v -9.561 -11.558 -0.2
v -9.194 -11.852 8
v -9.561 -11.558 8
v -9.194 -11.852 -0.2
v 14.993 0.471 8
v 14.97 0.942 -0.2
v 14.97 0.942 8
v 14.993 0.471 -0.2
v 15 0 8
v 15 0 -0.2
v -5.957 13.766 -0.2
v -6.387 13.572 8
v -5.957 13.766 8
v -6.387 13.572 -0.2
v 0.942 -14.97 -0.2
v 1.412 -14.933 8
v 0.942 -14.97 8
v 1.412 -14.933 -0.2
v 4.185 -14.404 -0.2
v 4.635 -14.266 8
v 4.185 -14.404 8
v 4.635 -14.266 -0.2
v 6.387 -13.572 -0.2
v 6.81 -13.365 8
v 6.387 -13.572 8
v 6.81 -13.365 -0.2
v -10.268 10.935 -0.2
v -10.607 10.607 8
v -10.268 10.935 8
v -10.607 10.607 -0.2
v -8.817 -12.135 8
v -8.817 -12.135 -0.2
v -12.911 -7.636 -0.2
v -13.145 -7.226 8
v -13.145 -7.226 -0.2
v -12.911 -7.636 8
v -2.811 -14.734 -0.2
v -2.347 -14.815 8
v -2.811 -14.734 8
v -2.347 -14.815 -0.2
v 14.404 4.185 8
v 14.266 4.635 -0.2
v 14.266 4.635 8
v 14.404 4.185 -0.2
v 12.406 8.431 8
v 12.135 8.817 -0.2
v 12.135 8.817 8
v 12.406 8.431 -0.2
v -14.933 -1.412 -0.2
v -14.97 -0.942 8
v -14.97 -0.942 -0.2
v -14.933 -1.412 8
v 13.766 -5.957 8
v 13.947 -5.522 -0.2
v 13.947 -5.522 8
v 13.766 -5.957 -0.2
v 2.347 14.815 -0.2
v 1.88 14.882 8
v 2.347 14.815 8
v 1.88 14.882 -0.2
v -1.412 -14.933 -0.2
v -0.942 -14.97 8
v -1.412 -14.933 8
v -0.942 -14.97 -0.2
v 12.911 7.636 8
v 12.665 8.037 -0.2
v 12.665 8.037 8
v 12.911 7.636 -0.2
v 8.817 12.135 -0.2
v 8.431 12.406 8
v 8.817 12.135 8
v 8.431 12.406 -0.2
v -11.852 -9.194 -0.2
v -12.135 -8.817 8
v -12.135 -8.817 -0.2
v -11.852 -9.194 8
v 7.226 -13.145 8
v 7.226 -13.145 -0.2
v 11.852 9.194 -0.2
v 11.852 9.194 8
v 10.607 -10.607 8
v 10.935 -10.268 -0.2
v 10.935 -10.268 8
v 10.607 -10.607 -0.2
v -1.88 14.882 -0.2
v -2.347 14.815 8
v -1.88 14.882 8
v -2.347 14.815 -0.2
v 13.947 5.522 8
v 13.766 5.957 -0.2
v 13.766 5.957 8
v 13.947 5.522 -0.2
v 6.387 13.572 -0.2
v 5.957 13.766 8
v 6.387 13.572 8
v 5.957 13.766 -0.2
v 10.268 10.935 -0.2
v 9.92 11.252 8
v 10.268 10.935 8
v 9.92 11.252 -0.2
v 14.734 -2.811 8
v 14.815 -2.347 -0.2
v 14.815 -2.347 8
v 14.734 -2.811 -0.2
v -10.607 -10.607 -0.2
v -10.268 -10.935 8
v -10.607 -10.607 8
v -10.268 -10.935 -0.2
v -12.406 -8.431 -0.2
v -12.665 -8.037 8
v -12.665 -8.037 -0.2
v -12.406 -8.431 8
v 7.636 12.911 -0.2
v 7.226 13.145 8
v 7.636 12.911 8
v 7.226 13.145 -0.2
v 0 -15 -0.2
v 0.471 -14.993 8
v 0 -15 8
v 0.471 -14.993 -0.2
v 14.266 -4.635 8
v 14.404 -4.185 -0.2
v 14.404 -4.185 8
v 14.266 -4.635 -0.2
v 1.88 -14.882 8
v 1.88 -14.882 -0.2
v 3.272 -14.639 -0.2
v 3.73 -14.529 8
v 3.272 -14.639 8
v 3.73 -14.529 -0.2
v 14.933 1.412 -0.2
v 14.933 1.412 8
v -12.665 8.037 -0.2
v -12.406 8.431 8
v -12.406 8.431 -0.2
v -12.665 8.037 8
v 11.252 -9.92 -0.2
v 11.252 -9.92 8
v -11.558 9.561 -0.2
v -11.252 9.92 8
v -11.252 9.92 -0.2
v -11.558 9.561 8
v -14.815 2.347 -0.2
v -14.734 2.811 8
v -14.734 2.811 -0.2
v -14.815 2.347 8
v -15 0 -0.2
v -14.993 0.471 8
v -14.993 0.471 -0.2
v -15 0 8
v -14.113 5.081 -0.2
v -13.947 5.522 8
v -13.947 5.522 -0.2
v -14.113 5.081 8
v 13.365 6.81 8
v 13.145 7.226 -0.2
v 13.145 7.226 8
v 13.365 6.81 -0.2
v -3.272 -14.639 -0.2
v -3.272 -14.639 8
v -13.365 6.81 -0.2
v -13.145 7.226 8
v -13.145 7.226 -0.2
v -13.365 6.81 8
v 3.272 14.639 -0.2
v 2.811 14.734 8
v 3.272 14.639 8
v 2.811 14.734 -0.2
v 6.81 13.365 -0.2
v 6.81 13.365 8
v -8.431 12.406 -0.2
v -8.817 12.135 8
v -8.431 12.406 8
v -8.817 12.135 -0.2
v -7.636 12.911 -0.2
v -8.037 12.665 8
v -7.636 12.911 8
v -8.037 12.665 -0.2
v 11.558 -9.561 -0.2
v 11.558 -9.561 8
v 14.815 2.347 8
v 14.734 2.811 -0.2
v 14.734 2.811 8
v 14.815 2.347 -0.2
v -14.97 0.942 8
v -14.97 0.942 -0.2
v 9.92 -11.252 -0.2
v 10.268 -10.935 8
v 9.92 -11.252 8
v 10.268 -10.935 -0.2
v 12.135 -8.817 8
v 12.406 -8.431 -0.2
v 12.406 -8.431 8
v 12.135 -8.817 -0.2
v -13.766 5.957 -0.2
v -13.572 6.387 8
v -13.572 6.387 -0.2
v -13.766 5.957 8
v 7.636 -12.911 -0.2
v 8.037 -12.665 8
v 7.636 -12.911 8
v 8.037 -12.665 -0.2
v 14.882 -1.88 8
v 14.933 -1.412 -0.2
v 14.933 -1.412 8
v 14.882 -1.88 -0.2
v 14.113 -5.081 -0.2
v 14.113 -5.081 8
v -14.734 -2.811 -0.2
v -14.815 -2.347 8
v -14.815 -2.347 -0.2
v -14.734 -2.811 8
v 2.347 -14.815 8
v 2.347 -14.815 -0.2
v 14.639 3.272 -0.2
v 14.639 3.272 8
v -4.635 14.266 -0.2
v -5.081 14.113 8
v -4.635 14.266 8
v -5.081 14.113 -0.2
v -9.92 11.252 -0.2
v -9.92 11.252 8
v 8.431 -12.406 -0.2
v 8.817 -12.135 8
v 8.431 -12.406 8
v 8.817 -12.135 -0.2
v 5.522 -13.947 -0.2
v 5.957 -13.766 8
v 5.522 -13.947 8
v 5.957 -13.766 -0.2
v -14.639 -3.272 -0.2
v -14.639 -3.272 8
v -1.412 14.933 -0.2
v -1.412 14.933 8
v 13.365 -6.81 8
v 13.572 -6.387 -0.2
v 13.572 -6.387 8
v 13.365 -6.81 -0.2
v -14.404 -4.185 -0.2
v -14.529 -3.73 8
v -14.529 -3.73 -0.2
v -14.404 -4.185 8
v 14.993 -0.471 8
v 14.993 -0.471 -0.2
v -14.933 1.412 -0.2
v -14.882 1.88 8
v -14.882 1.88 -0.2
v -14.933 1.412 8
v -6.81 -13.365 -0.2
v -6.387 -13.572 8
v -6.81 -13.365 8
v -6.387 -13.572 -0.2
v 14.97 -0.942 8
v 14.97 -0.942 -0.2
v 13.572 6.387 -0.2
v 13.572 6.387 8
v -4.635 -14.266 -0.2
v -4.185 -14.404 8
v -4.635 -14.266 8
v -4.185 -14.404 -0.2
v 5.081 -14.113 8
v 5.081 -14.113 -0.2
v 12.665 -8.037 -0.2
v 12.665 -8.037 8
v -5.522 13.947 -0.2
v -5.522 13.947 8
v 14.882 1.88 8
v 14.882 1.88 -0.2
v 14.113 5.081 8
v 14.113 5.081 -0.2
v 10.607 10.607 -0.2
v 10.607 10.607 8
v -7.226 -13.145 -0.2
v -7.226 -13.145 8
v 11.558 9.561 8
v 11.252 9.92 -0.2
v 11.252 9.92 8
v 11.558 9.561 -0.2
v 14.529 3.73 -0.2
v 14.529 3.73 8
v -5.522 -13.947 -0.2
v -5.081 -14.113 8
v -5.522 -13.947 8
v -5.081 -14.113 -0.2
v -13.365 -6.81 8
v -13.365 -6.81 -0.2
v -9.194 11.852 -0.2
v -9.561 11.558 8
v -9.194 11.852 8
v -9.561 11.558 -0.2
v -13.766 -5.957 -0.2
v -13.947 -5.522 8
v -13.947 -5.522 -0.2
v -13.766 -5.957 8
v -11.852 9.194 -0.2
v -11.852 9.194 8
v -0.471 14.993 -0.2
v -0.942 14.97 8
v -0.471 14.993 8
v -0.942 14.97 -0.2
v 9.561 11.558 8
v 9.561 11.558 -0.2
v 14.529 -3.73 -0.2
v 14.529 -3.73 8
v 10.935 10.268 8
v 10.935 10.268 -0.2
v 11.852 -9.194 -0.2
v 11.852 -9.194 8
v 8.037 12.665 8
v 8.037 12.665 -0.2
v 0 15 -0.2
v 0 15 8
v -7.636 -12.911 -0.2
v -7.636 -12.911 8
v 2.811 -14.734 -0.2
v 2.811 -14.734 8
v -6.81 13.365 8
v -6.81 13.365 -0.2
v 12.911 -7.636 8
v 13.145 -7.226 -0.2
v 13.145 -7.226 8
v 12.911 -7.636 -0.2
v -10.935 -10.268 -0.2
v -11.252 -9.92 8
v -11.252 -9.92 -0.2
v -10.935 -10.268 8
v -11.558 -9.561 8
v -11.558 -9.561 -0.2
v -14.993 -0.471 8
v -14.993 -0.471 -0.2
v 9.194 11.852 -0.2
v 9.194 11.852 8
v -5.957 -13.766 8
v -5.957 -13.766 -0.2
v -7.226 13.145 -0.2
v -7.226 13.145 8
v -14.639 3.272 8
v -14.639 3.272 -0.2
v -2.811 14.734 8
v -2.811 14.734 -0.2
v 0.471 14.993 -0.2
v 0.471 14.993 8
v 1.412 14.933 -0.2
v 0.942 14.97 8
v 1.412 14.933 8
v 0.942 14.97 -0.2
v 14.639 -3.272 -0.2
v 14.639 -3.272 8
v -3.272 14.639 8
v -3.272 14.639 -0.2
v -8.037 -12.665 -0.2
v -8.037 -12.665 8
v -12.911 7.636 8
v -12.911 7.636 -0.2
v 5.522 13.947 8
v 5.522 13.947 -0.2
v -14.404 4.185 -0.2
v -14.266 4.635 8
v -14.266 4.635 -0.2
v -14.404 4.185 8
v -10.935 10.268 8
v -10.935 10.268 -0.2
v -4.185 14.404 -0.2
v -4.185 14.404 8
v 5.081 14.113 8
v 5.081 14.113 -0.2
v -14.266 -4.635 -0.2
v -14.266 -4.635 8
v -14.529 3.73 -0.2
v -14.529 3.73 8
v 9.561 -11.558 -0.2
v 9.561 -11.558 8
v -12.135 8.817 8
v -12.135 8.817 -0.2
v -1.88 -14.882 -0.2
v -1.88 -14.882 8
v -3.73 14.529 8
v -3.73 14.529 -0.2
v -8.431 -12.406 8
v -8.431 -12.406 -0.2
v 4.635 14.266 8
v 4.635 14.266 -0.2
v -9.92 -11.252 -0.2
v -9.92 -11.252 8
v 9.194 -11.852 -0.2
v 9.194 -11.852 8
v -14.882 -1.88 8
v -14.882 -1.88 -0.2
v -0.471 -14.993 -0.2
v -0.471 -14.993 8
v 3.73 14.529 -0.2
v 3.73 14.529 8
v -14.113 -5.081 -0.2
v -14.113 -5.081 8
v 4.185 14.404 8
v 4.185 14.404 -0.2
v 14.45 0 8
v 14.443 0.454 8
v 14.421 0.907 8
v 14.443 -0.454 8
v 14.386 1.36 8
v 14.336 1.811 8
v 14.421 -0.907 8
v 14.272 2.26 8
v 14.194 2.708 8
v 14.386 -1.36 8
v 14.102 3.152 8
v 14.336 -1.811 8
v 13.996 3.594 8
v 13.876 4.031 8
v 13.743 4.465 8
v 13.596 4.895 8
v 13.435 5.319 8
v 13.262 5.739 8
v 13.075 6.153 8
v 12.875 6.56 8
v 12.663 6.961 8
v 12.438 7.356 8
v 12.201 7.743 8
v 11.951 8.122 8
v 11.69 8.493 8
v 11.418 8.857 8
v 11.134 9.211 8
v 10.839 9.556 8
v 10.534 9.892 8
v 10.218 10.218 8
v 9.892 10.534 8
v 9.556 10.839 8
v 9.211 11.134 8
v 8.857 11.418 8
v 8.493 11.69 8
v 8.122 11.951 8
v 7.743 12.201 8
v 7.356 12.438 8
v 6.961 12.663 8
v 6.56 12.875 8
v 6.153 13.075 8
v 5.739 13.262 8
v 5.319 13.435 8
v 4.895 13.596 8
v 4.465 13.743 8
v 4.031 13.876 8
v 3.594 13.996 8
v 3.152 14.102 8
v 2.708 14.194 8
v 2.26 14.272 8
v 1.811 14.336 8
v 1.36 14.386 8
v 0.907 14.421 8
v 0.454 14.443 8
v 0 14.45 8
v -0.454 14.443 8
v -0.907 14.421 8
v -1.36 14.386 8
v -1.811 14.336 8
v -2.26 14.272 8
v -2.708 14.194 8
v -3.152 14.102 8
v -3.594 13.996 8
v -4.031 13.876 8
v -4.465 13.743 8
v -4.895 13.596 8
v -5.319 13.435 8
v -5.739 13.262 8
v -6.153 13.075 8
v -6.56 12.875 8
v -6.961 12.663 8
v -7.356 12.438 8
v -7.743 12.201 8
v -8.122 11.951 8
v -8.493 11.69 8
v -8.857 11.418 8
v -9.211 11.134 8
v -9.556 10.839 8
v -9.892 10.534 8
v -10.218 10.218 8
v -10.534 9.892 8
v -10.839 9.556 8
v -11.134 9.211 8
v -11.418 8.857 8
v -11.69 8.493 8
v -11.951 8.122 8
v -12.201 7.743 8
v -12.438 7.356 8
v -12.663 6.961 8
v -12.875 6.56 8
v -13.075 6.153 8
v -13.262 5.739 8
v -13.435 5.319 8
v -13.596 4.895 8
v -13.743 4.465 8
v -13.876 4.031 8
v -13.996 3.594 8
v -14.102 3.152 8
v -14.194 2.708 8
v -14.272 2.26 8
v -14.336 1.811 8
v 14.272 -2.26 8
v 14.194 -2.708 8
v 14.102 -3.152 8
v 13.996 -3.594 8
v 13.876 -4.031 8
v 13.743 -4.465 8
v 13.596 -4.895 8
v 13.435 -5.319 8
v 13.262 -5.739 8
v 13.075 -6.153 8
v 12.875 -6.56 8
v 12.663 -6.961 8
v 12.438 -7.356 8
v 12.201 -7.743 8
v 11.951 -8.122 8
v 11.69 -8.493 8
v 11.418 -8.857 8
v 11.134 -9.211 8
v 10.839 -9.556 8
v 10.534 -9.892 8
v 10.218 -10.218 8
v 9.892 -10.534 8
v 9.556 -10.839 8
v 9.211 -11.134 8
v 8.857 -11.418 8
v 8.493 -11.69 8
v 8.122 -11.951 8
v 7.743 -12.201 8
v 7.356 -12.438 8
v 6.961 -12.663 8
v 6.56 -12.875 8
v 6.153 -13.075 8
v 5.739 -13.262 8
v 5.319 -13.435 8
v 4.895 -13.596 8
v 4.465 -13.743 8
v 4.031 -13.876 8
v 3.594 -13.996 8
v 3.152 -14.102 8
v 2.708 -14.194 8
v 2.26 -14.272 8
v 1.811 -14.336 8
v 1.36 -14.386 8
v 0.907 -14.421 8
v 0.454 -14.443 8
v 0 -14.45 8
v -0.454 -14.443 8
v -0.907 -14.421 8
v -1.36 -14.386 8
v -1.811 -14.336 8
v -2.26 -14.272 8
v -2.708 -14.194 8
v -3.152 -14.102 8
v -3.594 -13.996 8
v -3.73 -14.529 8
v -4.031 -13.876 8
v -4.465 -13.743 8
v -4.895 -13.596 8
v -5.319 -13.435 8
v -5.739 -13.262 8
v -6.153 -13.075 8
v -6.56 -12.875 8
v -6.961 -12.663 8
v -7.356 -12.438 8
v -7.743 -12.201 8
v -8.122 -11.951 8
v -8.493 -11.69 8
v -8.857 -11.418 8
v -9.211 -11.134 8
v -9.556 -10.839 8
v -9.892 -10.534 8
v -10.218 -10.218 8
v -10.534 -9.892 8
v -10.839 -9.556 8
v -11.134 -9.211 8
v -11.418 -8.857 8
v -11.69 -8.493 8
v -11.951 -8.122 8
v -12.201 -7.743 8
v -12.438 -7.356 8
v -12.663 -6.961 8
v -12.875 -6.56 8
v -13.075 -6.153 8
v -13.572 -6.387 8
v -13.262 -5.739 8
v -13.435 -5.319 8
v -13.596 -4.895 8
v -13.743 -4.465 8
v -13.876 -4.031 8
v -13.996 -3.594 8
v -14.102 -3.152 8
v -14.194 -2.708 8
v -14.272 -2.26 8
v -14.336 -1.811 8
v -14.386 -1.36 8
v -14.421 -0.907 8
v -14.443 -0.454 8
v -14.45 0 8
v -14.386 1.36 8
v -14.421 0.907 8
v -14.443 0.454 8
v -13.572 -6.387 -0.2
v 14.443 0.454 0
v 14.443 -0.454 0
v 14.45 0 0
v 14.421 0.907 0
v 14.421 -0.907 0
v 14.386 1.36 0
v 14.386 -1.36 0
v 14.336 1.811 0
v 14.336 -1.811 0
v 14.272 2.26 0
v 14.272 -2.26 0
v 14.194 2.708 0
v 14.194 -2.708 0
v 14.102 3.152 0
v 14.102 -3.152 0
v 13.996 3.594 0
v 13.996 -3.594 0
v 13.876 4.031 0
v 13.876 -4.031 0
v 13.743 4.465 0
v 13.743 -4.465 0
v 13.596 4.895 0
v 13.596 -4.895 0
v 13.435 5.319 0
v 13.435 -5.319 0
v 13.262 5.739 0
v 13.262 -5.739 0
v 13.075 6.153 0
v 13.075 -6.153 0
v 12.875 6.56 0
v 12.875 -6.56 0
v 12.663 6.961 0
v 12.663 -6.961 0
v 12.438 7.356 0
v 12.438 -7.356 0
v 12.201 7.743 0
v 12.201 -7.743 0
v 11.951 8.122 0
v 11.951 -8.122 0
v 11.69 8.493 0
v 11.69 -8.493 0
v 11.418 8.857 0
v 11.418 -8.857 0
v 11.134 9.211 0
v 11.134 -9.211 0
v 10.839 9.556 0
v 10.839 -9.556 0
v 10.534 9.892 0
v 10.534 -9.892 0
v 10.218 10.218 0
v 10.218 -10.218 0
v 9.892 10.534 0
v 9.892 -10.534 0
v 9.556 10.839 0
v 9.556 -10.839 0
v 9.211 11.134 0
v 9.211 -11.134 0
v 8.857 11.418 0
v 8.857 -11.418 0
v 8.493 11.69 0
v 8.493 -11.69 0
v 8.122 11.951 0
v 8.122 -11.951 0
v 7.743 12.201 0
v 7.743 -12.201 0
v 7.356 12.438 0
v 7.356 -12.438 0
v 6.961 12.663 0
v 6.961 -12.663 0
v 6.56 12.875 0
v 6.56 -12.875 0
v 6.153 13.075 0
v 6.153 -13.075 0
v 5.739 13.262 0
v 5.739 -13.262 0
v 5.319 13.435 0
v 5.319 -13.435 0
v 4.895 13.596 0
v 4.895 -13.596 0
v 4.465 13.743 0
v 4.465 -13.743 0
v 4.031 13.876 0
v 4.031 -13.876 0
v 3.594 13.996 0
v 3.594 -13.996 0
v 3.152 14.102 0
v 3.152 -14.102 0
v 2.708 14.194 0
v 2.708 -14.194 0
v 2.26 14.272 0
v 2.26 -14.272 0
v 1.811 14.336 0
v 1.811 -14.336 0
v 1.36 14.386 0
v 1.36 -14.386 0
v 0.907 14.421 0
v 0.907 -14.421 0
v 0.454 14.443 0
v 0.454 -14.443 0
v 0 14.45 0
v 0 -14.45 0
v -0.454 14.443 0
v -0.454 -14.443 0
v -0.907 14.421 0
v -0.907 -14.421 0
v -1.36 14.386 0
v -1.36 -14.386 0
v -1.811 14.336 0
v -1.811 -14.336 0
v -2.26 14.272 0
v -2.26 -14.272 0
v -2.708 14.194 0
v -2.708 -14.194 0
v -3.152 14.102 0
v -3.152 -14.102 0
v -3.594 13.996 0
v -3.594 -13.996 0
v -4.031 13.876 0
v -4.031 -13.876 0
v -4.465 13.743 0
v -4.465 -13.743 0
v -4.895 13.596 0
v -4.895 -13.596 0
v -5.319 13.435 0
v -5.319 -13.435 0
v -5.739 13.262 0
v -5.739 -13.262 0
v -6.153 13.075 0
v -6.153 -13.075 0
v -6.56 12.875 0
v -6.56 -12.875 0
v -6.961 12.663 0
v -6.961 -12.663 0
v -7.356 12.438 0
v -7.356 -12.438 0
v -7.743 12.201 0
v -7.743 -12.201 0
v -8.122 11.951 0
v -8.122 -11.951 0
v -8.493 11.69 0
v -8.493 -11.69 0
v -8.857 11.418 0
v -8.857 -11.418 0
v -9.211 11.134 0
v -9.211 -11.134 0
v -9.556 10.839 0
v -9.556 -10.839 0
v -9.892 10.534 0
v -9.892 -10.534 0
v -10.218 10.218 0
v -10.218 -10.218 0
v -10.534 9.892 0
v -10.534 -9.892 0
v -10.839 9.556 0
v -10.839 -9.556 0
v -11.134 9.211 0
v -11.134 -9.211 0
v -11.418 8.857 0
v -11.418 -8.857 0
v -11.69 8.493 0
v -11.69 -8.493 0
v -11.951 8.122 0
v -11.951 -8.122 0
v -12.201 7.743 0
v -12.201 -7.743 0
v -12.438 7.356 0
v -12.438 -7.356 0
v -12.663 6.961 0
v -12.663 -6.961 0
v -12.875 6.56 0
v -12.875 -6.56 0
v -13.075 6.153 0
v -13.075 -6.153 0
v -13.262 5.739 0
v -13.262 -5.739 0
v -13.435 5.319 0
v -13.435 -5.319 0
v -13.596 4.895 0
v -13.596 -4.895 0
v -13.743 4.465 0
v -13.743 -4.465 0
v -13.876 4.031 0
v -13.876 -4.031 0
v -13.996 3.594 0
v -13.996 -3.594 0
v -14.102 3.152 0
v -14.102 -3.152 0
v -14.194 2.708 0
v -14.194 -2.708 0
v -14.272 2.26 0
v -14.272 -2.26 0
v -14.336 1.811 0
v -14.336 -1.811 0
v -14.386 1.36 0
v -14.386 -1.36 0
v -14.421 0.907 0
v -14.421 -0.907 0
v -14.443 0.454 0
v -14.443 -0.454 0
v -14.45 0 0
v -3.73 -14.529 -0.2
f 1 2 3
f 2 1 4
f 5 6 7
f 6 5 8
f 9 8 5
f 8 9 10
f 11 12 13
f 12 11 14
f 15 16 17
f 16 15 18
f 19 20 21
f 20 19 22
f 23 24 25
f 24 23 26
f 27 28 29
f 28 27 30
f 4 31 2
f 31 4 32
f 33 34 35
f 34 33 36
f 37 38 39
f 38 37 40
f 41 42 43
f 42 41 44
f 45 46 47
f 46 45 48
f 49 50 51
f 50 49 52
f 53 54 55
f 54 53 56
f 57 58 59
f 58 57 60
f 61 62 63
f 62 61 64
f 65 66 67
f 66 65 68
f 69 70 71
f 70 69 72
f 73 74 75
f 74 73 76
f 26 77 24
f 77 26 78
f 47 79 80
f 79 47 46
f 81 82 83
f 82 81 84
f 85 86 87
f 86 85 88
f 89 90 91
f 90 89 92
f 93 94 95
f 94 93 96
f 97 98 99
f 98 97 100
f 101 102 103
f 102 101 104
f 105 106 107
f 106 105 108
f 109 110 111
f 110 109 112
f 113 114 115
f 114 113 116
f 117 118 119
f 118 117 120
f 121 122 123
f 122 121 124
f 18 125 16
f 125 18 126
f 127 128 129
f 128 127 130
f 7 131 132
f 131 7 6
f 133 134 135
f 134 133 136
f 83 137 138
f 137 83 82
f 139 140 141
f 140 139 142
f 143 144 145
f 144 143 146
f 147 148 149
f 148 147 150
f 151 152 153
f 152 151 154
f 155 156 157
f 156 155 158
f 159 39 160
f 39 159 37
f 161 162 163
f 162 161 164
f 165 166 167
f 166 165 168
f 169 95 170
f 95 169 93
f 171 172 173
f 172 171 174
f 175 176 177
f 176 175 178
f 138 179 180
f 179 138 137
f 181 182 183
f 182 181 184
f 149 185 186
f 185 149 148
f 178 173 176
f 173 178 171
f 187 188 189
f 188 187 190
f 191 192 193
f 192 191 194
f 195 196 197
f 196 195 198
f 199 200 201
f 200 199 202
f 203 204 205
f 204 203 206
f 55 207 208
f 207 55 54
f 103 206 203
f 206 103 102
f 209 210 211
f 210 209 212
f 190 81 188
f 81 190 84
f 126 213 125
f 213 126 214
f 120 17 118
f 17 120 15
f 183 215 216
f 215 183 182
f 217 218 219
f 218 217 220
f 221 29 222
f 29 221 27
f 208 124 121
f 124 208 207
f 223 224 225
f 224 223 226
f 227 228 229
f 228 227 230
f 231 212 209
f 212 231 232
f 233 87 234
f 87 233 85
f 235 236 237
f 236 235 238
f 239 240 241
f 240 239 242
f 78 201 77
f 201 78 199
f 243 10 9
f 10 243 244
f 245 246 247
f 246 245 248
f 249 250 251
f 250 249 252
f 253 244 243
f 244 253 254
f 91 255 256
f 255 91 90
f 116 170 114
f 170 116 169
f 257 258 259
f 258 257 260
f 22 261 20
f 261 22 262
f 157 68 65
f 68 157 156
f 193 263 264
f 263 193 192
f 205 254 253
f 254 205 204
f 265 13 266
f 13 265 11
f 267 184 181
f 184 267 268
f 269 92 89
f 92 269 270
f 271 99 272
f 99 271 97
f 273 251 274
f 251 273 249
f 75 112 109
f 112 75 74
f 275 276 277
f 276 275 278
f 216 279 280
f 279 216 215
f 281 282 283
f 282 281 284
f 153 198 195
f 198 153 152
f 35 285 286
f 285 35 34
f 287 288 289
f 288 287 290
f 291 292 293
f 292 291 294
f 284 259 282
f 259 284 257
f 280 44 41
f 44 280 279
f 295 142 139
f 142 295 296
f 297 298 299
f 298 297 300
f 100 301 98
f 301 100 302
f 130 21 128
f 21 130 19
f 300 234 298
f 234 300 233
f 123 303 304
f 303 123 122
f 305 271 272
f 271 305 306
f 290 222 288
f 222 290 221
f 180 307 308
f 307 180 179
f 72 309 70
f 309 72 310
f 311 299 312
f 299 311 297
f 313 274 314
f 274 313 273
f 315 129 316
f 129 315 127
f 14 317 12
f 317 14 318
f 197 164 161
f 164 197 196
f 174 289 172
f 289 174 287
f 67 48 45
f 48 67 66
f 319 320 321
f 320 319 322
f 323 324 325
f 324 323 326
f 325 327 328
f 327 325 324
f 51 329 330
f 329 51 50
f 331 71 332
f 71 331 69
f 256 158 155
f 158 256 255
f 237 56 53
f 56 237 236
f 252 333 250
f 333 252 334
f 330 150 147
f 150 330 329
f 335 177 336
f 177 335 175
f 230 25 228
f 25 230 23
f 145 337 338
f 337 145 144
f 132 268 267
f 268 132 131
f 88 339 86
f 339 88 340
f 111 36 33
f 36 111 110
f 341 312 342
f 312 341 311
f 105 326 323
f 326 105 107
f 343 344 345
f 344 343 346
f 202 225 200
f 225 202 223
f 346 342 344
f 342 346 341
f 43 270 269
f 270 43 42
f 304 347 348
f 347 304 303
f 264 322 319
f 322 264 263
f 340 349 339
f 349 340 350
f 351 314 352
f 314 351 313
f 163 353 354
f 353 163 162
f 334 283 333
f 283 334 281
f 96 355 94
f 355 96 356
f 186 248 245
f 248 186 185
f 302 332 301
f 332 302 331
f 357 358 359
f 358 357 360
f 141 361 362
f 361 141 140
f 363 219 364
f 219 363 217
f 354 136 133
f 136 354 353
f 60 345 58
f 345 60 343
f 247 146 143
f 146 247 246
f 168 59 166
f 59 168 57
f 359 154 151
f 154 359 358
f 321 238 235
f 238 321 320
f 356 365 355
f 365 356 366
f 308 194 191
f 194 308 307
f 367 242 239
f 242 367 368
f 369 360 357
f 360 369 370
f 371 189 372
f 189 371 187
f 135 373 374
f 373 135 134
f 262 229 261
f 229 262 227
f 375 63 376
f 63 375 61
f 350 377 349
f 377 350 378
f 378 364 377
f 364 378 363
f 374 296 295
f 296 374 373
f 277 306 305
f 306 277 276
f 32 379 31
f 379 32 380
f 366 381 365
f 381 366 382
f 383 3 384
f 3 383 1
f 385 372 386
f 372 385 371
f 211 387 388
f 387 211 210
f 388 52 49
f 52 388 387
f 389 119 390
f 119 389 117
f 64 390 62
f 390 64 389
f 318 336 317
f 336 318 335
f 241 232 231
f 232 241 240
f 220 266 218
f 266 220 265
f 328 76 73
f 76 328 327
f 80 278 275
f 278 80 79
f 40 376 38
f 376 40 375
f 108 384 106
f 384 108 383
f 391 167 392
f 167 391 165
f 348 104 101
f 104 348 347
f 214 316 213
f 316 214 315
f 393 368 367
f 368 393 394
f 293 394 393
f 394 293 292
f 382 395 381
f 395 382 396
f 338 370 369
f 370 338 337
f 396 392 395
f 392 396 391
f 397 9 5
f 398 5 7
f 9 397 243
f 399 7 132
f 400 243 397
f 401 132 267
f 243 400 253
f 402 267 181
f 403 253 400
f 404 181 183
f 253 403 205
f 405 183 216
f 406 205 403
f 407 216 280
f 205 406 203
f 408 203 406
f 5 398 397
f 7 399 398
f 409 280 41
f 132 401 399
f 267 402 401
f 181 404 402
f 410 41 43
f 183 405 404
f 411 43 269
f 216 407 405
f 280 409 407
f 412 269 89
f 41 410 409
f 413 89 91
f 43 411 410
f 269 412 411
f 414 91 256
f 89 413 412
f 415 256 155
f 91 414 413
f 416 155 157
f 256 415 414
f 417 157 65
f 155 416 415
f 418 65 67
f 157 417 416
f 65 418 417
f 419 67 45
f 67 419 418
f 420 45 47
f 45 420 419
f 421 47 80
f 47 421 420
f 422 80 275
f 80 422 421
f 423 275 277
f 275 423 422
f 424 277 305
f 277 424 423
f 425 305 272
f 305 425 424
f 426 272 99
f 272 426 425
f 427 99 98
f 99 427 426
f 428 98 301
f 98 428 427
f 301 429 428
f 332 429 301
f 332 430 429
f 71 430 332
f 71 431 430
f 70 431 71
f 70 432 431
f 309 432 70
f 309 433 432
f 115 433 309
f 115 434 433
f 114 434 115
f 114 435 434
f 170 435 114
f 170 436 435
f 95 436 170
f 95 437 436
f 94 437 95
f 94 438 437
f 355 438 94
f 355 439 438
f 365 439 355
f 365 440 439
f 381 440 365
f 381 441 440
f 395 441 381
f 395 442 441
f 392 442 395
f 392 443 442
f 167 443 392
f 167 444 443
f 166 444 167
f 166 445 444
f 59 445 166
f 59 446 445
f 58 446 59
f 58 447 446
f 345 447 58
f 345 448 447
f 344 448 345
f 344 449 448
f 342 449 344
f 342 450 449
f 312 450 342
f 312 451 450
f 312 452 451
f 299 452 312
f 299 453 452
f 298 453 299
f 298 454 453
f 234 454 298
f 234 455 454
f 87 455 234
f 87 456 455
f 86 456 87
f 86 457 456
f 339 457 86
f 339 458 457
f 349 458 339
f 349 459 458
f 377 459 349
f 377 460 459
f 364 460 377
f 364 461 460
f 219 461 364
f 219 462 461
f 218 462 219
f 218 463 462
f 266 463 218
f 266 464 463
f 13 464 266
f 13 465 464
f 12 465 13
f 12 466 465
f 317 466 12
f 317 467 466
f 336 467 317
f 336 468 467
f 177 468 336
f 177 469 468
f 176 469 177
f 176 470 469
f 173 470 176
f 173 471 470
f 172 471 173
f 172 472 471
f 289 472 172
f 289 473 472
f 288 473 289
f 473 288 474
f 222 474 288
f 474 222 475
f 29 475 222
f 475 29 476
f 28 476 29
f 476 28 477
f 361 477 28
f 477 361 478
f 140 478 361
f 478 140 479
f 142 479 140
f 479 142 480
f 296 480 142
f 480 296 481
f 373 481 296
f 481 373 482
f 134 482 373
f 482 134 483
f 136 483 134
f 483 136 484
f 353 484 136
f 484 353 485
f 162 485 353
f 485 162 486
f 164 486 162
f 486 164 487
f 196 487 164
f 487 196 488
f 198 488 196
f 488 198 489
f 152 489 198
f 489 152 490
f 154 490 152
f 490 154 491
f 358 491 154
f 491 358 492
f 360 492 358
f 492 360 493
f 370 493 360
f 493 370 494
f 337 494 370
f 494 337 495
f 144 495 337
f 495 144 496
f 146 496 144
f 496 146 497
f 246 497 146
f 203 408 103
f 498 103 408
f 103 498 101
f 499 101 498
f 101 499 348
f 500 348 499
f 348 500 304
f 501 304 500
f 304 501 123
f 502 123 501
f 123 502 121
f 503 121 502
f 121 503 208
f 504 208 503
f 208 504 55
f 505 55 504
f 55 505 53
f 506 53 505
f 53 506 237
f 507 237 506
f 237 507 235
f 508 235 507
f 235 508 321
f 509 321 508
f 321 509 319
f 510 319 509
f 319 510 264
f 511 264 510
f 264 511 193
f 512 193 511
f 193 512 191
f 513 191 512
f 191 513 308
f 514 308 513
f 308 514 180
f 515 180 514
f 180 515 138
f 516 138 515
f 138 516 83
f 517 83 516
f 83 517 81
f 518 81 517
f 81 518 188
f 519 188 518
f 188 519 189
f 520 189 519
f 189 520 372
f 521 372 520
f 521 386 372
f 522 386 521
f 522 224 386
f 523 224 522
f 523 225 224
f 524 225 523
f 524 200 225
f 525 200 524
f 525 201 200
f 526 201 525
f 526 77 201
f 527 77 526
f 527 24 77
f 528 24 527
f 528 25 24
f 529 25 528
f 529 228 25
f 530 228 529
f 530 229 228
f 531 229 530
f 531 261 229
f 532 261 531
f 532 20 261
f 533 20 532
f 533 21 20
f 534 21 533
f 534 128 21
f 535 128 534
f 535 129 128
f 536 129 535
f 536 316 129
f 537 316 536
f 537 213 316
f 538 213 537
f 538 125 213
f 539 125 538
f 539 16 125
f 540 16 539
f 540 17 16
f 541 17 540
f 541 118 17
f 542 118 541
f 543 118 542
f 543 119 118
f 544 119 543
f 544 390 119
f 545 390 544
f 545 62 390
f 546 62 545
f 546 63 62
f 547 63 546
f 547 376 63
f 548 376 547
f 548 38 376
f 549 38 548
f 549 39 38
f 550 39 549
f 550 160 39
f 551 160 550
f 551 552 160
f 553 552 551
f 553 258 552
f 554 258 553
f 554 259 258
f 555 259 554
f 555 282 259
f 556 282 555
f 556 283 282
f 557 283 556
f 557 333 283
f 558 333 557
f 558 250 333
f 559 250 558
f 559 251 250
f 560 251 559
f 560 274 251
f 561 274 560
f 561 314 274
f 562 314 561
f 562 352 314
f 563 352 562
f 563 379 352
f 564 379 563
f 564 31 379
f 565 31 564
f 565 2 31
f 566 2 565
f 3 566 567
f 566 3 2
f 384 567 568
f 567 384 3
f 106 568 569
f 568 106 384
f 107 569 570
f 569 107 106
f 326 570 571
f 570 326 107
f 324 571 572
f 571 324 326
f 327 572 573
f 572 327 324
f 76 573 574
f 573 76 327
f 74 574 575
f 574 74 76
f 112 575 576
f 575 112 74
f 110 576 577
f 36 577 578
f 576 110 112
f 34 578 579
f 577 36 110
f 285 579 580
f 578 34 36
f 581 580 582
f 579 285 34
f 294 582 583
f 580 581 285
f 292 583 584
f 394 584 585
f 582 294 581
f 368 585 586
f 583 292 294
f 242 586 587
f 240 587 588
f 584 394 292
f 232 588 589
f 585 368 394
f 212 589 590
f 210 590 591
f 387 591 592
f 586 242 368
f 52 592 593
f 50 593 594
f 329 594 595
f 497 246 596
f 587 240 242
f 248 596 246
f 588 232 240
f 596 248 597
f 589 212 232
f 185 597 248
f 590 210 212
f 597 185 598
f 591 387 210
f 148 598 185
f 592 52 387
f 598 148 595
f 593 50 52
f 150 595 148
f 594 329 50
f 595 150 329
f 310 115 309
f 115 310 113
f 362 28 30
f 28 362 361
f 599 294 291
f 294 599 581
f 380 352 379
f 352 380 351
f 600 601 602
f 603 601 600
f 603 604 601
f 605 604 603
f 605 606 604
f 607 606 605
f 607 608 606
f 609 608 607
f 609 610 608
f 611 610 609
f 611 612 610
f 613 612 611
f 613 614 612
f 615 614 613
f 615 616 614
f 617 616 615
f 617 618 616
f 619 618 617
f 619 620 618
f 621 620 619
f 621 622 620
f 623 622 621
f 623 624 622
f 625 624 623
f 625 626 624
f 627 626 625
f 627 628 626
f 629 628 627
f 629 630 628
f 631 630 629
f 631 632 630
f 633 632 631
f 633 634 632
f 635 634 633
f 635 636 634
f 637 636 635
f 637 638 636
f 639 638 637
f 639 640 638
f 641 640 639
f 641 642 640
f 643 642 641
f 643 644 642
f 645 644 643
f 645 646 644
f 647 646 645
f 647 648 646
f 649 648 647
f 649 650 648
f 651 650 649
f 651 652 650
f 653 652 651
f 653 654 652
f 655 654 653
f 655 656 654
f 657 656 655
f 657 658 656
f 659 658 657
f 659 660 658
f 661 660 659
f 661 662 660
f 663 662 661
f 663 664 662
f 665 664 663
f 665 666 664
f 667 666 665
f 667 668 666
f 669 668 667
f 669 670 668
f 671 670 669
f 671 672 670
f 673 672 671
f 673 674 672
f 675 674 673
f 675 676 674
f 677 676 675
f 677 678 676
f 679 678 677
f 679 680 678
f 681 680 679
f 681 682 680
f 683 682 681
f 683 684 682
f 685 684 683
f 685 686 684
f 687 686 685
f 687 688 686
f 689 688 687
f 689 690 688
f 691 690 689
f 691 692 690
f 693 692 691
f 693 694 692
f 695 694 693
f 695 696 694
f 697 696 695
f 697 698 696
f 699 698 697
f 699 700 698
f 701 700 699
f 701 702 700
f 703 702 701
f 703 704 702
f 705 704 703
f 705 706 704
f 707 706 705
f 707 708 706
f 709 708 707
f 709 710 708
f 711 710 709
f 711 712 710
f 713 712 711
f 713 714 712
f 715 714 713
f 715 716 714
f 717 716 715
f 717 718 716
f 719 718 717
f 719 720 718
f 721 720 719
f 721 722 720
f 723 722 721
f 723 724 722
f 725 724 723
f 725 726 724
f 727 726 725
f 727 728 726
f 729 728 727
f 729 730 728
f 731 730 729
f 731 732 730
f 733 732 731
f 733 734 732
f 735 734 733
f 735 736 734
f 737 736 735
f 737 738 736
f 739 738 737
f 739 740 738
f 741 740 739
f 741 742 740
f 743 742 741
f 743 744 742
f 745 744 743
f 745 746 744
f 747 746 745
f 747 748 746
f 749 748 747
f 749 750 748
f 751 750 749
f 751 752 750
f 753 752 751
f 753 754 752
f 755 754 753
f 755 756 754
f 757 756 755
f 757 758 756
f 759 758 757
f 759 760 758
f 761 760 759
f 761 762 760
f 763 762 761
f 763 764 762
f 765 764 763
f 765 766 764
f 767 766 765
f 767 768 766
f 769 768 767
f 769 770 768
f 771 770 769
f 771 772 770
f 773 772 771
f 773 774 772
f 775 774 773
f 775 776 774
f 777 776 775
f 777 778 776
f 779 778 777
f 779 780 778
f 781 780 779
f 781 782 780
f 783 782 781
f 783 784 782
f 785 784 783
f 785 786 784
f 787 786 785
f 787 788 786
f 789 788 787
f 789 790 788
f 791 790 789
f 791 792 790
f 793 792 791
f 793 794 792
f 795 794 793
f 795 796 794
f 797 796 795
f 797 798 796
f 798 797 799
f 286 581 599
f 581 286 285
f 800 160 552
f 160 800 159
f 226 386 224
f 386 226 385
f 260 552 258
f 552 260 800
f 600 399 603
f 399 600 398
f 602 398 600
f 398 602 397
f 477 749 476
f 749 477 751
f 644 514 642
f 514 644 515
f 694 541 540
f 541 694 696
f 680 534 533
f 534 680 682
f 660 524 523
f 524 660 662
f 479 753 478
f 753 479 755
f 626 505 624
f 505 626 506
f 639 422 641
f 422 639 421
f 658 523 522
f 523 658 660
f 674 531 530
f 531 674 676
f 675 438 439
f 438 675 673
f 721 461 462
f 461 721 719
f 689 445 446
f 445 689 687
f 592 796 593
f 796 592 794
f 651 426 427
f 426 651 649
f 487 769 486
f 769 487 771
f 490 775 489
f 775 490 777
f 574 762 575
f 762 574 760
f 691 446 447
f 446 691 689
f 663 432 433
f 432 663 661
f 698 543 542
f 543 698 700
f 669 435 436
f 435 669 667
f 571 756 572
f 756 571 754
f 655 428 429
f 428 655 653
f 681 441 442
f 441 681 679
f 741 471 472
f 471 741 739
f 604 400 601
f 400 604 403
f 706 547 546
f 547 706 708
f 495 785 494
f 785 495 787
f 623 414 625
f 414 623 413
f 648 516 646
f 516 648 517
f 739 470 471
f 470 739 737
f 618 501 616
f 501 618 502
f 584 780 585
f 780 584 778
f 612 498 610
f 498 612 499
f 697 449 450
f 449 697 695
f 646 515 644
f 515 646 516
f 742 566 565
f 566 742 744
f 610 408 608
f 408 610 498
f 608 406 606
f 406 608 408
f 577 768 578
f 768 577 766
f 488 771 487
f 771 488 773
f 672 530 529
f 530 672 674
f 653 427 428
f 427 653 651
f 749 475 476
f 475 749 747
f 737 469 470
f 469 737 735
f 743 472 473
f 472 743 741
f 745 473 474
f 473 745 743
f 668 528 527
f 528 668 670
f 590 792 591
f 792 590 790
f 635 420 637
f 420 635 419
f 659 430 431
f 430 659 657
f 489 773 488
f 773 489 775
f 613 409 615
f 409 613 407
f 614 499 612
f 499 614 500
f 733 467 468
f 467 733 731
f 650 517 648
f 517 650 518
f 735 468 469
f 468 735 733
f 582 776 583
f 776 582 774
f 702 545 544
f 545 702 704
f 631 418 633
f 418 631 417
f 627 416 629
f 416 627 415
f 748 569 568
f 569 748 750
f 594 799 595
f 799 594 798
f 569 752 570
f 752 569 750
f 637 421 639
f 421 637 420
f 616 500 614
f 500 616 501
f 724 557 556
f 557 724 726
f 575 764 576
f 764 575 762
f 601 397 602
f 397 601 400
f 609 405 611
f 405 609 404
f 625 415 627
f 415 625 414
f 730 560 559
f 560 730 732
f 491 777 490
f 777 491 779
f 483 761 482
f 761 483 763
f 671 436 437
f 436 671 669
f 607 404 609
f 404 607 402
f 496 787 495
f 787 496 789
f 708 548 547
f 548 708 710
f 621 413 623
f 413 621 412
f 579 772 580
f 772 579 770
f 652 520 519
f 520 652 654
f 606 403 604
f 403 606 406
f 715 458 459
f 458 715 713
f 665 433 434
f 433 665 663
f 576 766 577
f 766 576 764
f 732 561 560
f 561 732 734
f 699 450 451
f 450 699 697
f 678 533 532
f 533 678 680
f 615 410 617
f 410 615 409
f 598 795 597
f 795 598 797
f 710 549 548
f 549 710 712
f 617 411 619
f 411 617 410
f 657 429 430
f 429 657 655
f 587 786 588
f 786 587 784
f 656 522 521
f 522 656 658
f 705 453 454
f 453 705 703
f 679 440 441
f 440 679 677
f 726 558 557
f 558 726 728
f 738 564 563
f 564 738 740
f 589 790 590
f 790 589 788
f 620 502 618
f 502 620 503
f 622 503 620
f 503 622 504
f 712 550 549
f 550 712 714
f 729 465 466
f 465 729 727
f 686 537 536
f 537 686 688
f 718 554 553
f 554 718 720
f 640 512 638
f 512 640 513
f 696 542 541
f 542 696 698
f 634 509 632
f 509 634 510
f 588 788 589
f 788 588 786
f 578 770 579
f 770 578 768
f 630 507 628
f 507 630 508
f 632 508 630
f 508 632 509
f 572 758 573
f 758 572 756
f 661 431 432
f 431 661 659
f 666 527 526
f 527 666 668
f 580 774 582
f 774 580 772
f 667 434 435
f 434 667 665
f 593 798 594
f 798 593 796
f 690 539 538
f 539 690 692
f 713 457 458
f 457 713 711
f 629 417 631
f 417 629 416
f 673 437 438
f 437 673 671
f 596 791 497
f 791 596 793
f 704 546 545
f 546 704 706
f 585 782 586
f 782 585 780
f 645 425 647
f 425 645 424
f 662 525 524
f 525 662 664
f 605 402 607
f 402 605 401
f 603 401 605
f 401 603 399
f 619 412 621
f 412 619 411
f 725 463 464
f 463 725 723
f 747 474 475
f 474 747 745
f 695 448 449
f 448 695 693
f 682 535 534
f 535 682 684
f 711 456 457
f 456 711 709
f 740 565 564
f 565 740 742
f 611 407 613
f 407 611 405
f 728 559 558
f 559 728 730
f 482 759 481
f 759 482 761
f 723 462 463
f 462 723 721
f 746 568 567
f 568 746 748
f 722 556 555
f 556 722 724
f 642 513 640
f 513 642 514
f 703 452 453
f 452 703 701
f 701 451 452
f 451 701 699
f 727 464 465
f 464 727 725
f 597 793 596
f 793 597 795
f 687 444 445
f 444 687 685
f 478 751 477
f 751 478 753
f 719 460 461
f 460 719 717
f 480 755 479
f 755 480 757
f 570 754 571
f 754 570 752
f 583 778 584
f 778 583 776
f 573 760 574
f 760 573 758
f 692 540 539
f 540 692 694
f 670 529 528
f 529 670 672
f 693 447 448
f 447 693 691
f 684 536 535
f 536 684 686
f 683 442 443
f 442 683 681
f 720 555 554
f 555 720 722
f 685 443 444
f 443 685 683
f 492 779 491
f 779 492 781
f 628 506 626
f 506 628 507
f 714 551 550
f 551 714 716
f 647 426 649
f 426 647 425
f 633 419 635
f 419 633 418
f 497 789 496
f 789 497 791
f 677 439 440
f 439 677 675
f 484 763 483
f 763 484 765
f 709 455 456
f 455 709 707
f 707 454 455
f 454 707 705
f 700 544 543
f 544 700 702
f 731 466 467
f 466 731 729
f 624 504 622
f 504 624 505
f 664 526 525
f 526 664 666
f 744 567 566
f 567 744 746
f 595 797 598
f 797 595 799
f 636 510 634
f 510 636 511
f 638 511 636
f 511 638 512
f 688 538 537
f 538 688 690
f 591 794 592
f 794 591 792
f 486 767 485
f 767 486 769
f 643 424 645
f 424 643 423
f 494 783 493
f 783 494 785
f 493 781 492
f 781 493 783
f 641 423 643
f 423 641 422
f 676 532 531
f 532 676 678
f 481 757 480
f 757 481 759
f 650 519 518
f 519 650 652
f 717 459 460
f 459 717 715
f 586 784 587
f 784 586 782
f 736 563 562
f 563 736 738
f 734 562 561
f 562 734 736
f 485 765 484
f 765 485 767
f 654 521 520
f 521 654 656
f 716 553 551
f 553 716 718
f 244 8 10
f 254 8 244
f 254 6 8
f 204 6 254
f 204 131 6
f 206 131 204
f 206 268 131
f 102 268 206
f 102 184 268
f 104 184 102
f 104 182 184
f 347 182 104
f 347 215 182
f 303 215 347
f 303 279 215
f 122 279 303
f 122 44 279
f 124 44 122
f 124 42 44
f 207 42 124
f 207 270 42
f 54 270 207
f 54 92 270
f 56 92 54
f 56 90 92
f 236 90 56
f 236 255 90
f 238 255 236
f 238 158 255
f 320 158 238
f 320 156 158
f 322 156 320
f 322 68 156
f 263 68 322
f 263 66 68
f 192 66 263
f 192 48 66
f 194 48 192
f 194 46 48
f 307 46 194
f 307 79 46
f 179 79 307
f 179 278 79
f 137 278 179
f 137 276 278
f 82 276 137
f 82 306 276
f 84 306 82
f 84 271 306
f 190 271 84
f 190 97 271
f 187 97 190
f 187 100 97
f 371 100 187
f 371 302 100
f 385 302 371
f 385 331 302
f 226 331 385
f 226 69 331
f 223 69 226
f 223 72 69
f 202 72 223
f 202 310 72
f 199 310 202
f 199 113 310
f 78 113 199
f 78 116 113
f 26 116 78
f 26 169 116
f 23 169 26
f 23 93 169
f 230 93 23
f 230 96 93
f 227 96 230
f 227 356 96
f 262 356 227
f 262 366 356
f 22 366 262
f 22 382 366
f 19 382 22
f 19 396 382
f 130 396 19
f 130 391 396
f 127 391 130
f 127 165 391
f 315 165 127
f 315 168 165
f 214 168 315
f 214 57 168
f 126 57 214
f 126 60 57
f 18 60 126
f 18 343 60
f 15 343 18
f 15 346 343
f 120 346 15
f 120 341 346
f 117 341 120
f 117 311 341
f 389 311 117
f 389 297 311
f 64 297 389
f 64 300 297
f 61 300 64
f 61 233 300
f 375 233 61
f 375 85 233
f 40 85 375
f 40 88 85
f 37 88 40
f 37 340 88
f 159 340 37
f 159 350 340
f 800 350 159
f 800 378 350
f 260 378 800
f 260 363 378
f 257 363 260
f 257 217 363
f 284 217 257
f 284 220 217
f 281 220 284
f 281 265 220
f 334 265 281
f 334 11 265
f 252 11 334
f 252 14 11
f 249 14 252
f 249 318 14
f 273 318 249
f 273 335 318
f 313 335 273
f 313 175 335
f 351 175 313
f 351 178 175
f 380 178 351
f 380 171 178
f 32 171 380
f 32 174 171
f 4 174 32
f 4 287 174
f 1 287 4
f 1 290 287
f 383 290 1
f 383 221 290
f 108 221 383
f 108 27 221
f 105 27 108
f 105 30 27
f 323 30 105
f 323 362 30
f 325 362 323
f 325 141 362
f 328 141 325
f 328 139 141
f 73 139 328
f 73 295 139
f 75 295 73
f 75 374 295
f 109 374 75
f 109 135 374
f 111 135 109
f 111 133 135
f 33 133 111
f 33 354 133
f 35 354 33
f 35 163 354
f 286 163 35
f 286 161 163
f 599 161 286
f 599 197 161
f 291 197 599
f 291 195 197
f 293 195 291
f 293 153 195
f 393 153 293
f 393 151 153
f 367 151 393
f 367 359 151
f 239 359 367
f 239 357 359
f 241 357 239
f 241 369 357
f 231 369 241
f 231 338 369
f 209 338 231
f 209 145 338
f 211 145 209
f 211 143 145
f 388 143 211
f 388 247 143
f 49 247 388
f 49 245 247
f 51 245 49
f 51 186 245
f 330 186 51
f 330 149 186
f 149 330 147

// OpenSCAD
//Diameter of cylinder
diameter=30;
//Width of single wall layer
extrusionWidth=0.55;
//Height of cylinder
height=8;
//Height/thickness of bottom (0 for no bottom)
layerHeight=0.2;


/* [hidden] */
rad=diameter/2;
$fn=200;

union() {
translate([0,0,-layerHeight]) cylinder(r=rad, h=layerHeight);
	difference () {
		cylinder(r=rad, h=height);
		translate([0,0,-1])
		cylinder(r=rad-extrusionWidth, h=height+2);
	}
}
